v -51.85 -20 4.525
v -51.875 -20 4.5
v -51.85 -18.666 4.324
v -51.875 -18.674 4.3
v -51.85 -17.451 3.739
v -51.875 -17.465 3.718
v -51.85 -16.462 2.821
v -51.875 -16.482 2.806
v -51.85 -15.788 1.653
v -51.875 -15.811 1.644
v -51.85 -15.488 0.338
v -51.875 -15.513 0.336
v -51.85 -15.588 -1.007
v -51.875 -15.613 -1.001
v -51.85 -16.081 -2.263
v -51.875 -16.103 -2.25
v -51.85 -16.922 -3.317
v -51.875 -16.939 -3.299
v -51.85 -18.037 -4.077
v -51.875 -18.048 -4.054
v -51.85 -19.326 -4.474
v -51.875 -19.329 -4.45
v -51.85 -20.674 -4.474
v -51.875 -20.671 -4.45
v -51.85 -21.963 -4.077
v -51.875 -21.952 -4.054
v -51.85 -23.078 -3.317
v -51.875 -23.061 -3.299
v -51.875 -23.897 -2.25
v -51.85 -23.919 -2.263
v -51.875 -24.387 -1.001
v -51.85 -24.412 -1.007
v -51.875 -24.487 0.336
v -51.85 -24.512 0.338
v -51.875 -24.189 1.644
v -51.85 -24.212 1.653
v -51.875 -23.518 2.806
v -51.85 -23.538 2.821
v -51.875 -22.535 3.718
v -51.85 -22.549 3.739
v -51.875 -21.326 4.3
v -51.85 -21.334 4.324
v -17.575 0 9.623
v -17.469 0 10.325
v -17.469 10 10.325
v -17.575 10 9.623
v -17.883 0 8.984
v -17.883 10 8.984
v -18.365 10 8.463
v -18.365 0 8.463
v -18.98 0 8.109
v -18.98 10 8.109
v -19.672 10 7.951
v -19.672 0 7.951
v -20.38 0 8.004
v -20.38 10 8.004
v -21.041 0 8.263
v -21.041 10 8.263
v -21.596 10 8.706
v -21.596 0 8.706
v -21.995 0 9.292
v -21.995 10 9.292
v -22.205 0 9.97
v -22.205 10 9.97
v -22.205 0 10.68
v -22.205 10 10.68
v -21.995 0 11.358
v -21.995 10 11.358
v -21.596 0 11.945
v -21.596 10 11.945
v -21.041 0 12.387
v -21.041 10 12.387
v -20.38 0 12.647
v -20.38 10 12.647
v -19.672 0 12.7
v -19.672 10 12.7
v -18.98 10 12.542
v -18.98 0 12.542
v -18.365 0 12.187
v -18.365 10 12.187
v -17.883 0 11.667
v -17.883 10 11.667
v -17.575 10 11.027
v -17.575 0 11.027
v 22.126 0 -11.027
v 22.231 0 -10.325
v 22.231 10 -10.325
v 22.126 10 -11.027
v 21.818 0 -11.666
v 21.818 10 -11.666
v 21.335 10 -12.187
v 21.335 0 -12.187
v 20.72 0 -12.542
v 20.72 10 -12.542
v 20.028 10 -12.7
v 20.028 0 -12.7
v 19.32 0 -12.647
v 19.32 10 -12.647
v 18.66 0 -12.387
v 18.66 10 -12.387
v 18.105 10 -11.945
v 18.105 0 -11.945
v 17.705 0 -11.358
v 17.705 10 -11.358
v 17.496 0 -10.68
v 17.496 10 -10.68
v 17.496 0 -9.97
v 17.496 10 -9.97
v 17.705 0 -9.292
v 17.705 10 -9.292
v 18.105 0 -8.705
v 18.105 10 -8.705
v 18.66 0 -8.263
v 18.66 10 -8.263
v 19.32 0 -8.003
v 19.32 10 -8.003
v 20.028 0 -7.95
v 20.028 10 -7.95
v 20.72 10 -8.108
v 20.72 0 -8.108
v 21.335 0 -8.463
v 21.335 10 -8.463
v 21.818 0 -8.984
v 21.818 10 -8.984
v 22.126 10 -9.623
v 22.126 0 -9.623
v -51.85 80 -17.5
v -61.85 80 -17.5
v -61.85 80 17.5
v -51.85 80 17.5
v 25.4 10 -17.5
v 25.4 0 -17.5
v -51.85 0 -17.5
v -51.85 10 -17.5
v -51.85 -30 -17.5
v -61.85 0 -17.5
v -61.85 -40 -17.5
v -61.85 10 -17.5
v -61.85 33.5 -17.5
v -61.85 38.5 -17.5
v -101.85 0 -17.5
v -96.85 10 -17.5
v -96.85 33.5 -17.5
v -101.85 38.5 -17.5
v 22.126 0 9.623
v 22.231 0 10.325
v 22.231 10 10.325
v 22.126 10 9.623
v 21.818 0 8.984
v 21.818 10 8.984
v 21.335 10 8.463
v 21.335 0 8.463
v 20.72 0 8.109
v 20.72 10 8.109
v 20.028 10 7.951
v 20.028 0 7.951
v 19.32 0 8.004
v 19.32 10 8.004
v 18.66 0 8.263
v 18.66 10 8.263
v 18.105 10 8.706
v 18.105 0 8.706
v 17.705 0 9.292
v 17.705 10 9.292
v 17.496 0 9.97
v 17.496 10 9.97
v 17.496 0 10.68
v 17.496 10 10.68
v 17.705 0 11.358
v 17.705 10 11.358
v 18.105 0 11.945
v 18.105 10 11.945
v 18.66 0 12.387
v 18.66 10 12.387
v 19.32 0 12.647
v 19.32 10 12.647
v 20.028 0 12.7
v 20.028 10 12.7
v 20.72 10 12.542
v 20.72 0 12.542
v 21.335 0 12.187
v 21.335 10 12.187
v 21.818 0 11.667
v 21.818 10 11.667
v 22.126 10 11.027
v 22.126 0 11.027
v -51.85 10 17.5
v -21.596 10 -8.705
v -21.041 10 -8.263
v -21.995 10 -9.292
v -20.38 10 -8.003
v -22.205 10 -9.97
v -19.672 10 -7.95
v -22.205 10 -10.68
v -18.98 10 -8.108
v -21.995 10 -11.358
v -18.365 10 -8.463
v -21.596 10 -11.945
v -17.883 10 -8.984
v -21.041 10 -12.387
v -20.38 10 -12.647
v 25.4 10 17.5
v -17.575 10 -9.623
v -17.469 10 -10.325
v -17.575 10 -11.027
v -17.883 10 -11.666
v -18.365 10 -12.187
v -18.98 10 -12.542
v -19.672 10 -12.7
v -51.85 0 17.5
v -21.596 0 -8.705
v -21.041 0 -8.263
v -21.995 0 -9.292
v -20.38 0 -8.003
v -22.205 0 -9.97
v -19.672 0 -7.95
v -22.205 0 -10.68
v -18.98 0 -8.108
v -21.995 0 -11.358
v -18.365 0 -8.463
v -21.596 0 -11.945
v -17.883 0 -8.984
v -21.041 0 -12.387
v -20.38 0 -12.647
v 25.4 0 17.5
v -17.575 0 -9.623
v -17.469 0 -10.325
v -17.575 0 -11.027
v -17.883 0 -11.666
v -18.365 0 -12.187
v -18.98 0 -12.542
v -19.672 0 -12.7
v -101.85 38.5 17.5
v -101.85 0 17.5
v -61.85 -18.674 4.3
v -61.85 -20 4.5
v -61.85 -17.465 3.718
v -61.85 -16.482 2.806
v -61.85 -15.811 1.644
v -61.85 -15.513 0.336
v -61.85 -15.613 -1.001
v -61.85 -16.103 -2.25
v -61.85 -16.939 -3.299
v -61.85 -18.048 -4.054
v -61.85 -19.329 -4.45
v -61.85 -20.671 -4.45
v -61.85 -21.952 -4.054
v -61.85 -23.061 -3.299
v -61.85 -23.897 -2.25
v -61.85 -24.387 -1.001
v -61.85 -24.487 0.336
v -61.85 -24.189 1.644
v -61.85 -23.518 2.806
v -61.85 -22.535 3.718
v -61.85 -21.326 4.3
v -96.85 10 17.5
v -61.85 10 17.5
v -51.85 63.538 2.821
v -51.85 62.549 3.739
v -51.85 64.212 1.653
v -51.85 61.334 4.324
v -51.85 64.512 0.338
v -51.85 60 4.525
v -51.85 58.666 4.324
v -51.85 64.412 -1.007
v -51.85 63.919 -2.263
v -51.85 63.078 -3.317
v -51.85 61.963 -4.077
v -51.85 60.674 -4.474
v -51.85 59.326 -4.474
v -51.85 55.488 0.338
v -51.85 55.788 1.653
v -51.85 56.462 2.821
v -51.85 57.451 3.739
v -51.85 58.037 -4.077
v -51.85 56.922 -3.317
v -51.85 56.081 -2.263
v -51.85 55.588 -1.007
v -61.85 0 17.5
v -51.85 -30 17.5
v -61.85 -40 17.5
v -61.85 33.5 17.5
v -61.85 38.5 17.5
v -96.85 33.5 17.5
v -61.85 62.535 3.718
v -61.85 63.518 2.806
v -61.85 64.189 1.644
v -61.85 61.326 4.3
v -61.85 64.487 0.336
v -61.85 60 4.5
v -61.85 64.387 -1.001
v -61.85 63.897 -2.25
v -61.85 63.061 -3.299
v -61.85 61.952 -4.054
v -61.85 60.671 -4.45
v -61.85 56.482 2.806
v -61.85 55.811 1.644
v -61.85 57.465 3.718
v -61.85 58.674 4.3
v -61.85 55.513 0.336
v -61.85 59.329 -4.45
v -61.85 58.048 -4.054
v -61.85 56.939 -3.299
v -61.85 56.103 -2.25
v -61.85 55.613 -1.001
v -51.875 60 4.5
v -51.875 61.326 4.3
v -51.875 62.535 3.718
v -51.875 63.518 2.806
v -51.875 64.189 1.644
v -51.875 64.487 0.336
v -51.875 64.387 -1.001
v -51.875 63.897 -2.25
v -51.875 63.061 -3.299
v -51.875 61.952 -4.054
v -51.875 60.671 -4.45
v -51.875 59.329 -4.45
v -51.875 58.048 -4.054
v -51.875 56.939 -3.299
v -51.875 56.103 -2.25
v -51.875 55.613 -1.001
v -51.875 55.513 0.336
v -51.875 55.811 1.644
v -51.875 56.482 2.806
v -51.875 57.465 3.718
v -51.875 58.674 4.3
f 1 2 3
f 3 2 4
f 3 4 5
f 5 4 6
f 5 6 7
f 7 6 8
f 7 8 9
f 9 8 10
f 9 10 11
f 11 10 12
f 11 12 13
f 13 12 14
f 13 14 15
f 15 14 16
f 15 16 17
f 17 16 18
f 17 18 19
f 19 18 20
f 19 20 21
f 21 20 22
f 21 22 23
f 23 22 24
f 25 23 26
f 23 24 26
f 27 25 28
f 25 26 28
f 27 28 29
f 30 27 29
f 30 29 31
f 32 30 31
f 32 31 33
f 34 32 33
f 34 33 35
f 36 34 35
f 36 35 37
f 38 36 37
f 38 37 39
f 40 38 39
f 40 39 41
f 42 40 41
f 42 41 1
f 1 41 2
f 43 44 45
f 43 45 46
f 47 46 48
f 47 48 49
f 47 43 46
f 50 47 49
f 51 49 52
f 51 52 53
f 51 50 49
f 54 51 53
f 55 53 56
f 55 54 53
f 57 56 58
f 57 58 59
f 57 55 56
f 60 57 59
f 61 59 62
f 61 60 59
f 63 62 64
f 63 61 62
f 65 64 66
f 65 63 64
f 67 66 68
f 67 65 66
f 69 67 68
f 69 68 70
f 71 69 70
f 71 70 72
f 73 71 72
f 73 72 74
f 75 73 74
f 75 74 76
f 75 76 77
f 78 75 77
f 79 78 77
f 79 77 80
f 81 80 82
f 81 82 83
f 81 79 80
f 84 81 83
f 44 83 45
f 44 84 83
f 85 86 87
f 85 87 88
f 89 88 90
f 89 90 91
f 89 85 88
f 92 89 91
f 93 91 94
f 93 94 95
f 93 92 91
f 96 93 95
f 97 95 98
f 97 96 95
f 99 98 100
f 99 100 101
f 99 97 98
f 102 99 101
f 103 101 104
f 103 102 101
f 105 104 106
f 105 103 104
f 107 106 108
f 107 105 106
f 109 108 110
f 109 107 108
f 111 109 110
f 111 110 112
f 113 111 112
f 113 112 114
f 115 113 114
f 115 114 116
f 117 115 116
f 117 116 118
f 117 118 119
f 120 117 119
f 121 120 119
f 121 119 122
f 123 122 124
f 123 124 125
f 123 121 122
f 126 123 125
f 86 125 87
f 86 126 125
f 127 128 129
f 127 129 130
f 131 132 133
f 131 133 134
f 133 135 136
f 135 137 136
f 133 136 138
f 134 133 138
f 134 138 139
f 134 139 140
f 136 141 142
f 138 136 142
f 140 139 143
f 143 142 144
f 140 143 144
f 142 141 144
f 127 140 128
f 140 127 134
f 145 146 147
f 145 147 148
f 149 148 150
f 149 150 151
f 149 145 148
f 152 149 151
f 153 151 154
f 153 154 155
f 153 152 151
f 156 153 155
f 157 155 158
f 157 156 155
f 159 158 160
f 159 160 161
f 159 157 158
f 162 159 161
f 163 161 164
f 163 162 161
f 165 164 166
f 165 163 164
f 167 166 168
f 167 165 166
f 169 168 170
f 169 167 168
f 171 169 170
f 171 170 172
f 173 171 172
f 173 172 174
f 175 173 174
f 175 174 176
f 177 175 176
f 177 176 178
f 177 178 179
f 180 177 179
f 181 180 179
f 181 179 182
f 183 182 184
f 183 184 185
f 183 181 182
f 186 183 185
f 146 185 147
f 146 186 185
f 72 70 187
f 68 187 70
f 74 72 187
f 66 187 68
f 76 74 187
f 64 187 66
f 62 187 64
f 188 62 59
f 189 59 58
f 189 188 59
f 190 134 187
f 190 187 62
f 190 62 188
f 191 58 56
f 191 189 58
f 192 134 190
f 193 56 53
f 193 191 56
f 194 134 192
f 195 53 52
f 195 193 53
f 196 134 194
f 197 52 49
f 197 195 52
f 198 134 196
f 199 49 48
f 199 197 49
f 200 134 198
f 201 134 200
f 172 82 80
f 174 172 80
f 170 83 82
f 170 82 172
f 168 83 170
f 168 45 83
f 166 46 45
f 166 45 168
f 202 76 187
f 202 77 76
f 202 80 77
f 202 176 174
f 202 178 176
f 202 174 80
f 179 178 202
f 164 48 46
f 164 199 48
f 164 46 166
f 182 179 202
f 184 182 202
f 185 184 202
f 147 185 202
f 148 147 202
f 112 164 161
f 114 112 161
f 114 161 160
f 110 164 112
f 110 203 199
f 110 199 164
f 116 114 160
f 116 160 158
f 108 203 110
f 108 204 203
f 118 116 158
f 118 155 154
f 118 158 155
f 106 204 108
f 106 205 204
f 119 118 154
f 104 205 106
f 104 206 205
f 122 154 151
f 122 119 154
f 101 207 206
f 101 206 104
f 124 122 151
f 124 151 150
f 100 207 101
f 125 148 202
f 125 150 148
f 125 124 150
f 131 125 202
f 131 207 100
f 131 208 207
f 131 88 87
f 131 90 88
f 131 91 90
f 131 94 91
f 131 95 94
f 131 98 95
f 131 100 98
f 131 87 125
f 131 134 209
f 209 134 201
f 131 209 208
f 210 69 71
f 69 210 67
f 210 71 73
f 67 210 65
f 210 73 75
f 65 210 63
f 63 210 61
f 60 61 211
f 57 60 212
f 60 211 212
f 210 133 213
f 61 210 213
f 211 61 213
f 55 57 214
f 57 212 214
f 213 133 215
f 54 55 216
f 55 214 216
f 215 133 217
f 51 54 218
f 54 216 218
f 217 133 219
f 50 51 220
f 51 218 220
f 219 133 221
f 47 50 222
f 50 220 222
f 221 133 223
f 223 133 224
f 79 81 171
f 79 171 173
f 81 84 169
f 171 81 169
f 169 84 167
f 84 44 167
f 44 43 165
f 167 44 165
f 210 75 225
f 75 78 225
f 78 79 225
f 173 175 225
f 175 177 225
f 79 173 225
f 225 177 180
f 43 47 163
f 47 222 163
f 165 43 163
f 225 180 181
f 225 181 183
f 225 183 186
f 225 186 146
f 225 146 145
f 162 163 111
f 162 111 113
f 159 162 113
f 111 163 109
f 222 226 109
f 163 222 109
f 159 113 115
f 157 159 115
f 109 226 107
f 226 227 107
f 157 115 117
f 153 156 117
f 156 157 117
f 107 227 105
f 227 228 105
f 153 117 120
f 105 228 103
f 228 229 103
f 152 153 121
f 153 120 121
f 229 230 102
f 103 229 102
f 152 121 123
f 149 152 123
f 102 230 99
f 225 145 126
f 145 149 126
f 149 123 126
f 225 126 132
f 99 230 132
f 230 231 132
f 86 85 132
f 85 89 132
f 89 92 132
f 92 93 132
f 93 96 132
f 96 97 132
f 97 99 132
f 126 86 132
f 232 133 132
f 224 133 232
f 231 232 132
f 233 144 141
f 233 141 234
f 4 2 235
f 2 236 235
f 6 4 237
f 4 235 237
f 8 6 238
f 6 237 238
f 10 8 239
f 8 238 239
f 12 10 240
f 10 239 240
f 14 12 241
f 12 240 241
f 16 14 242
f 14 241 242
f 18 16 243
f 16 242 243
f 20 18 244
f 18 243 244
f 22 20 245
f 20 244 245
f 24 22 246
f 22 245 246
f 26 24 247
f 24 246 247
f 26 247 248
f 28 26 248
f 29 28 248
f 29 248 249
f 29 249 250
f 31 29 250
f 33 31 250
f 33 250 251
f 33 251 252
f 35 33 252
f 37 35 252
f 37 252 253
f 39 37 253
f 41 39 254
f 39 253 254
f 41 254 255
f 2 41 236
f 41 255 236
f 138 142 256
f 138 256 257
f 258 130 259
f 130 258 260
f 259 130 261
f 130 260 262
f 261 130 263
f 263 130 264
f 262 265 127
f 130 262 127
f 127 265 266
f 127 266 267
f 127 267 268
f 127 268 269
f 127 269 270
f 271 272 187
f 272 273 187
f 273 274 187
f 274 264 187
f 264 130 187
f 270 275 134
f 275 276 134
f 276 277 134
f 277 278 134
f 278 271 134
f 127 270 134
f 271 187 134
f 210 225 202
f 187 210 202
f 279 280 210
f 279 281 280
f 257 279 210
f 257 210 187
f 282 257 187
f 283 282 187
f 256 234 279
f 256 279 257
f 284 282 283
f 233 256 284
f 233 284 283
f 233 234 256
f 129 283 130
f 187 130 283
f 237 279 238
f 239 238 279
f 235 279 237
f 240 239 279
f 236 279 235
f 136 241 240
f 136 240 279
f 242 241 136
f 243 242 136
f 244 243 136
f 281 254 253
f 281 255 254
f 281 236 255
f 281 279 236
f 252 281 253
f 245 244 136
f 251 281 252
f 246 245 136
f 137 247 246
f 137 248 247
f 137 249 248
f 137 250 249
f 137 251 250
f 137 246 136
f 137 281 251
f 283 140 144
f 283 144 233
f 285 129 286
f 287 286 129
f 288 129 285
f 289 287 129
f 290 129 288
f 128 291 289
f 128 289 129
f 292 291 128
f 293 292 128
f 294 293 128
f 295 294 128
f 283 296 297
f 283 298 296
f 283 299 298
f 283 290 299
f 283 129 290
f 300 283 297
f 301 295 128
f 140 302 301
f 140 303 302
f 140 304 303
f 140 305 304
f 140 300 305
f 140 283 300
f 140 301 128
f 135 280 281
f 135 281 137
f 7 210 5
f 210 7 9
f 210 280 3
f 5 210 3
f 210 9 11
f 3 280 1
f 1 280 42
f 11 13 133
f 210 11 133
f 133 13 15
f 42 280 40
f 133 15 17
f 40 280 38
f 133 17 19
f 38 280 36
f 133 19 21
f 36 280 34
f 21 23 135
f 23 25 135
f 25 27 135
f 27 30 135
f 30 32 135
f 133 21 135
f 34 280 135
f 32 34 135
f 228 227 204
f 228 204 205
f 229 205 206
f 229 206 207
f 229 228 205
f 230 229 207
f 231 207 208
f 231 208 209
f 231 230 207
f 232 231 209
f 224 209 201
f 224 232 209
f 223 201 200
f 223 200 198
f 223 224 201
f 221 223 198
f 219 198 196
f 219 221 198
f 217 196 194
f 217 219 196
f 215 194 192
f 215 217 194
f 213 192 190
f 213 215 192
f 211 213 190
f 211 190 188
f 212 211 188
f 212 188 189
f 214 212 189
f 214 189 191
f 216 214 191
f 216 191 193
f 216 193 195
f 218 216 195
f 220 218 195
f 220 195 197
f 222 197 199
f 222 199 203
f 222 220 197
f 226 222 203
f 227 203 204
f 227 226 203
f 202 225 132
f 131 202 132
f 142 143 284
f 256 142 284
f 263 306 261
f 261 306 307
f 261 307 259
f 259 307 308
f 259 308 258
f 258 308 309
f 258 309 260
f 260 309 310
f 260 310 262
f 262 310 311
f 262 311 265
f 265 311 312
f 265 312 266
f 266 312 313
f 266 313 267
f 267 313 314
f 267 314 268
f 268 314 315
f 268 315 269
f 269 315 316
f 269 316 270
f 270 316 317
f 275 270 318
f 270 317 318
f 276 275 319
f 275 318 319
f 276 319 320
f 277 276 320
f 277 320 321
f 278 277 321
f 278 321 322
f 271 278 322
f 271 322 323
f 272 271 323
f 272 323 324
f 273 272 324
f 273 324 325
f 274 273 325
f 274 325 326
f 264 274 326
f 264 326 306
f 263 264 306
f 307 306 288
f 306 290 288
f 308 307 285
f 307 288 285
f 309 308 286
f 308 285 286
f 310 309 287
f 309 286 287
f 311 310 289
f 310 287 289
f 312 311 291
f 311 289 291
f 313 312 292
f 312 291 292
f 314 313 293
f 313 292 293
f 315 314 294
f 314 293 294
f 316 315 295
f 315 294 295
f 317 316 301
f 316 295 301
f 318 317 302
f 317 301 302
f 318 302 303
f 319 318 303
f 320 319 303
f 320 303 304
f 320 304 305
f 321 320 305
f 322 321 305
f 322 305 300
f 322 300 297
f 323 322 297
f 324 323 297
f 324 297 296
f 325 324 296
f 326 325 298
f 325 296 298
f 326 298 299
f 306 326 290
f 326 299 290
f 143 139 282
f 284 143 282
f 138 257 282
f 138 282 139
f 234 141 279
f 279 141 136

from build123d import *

# Parameters (mm, degrees)
BOSS_EXTRUDE1_OUTLINE_W        = 127.25
BOSS_EXTRUDE1_OUTLINE_H        = 35
BOSS_EXTRUDE1_OUTLINE_R        = 2.38125
BOSS_EXTRUDE1_DEPTH            = 10
BOSS_EXTRUDE2_DEPTH            = 70
BOSS_EXTRUDE2_DEPTH_BACK       = 50
SKETCH2_W                      = 10
SKETCH2_H                      = 35
CHAMFER1_SIZE                  = 10
SKETCH8_W                      = 35
SKETCH8_H                      = 5
BOSS_EXTRUDE4_DEPTH            = 40
SKETCH9_W                      = 35
SKETCH9_H                      = 23.5
BOSS_EXTRUDE5_DEPTH            = 5
M8_CLEARANCE_HOLE2_D           = 9
M8_CLEARANCE_HOLE2_DEPTH       = 23
M8_CLEARANCE_HOLE2_CSINK_D     = 9.05
M8_CLEARANCE_HOLE2_CSINK_ANGLE = 90
M8_CLEARANCE_HOLE2_TIP         = 2.703872786


# Read off the part's stored shape, not the designer's step: Boss-Extrude1
with BuildPart() as part:
    # Boss-Extrude1 outline → Boss-Extrude1 (new body)
    with BuildSketch(Plane(origin=(0, 0, 0), x_dir=(1, 0, 0), z_dir=(0, 1, 0))):
        with Locations((-38.225, 0)):
            Rectangle(BOSS_EXTRUDE1_OUTLINE_W, BOSS_EXTRUDE1_OUTLINE_H)
        with Locations((-19.85, -10.3252)):
            Circle(BOSS_EXTRUDE1_OUTLINE_R, mode=Mode.SUBTRACT)
        with Locations((19.8502, -10.3252)):
            Circle(BOSS_EXTRUDE1_OUTLINE_R, mode=Mode.SUBTRACT)
        with Locations((-19.85, 10.325)):
            Circle(BOSS_EXTRUDE1_OUTLINE_R, mode=Mode.SUBTRACT)
        with Locations((19.8502, 10.325)):
            Circle(BOSS_EXTRUDE1_OUTLINE_R, mode=Mode.SUBTRACT)
    extrude(amount=BOSS_EXTRUDE1_DEPTH)

    # Sketch2 → Boss-Extrude2 (add, two sides: drawn at the far end of the back side and taken through both)
    with BuildSketch(Plane(origin=(0, 10, 0), x_dir=(1, 0, 0), z_dir=(0, 1, 0)).offset(-BOSS_EXTRUDE2_DEPTH_BACK)):
        with Locations((-56.85, 0)):
            Rectangle(SKETCH2_W, SKETCH2_H)
    extrude(amount=BOSS_EXTRUDE2_DEPTH + BOSS_EXTRUDE2_DEPTH_BACK)

    # Chamfer1
    chamfer1_edges = [part.edges().sort_by_distance(p)[0] for p in [
        (-51.85, -40, 0),
    ]]
    chamfer(chamfer1_edges, length=CHAMFER1_SIZE - 0.0001)  # a hair under: the kernel refuses the full size

    # Sketch8 → Boss-Extrude4 (add)
    with BuildSketch(Plane.ZY.offset(61.85)):
        with Locations((0, 36)):
            Rectangle(SKETCH8_W, SKETCH8_H)
    extrude(amount=BOSS_EXTRUDE4_DEPTH)

    # Sketch9 → Boss-Extrude5 (add)
    with BuildSketch(Plane.ZY.offset(101.85)):
        with Locations((0, 21.75)):
            Rectangle(SKETCH9_W, SKETCH9_H)
    extrude(amount=-BOSS_EXTRUDE5_DEPTH)

    # M8 Clearance Hole2
    with Locations(Plane(origin=(-51.85, 0, 0), x_dir=(0, 0, -1), z_dir=(1, 0, 0))):
        with Locations((0, 60), (0, -20)):
            CounterSinkHole(M8_CLEARANCE_HOLE2_D / 2, M8_CLEARANCE_HOLE2_CSINK_D / 2, depth=M8_CLEARANCE_HOLE2_DEPTH, counter_sink_angle=M8_CLEARANCE_HOLE2_CSINK_ANGLE)
            with Locations((0, 0, -(M8_CLEARANCE_HOLE2_DEPTH + M8_CLEARANCE_HOLE2_TIP / 2))):  # 118° drill point
                Cone(0, M8_CLEARANCE_HOLE2_D / 2, M8_CLEARANCE_HOLE2_TIP, mode=Mode.SUBTRACT)


solid = part.part
